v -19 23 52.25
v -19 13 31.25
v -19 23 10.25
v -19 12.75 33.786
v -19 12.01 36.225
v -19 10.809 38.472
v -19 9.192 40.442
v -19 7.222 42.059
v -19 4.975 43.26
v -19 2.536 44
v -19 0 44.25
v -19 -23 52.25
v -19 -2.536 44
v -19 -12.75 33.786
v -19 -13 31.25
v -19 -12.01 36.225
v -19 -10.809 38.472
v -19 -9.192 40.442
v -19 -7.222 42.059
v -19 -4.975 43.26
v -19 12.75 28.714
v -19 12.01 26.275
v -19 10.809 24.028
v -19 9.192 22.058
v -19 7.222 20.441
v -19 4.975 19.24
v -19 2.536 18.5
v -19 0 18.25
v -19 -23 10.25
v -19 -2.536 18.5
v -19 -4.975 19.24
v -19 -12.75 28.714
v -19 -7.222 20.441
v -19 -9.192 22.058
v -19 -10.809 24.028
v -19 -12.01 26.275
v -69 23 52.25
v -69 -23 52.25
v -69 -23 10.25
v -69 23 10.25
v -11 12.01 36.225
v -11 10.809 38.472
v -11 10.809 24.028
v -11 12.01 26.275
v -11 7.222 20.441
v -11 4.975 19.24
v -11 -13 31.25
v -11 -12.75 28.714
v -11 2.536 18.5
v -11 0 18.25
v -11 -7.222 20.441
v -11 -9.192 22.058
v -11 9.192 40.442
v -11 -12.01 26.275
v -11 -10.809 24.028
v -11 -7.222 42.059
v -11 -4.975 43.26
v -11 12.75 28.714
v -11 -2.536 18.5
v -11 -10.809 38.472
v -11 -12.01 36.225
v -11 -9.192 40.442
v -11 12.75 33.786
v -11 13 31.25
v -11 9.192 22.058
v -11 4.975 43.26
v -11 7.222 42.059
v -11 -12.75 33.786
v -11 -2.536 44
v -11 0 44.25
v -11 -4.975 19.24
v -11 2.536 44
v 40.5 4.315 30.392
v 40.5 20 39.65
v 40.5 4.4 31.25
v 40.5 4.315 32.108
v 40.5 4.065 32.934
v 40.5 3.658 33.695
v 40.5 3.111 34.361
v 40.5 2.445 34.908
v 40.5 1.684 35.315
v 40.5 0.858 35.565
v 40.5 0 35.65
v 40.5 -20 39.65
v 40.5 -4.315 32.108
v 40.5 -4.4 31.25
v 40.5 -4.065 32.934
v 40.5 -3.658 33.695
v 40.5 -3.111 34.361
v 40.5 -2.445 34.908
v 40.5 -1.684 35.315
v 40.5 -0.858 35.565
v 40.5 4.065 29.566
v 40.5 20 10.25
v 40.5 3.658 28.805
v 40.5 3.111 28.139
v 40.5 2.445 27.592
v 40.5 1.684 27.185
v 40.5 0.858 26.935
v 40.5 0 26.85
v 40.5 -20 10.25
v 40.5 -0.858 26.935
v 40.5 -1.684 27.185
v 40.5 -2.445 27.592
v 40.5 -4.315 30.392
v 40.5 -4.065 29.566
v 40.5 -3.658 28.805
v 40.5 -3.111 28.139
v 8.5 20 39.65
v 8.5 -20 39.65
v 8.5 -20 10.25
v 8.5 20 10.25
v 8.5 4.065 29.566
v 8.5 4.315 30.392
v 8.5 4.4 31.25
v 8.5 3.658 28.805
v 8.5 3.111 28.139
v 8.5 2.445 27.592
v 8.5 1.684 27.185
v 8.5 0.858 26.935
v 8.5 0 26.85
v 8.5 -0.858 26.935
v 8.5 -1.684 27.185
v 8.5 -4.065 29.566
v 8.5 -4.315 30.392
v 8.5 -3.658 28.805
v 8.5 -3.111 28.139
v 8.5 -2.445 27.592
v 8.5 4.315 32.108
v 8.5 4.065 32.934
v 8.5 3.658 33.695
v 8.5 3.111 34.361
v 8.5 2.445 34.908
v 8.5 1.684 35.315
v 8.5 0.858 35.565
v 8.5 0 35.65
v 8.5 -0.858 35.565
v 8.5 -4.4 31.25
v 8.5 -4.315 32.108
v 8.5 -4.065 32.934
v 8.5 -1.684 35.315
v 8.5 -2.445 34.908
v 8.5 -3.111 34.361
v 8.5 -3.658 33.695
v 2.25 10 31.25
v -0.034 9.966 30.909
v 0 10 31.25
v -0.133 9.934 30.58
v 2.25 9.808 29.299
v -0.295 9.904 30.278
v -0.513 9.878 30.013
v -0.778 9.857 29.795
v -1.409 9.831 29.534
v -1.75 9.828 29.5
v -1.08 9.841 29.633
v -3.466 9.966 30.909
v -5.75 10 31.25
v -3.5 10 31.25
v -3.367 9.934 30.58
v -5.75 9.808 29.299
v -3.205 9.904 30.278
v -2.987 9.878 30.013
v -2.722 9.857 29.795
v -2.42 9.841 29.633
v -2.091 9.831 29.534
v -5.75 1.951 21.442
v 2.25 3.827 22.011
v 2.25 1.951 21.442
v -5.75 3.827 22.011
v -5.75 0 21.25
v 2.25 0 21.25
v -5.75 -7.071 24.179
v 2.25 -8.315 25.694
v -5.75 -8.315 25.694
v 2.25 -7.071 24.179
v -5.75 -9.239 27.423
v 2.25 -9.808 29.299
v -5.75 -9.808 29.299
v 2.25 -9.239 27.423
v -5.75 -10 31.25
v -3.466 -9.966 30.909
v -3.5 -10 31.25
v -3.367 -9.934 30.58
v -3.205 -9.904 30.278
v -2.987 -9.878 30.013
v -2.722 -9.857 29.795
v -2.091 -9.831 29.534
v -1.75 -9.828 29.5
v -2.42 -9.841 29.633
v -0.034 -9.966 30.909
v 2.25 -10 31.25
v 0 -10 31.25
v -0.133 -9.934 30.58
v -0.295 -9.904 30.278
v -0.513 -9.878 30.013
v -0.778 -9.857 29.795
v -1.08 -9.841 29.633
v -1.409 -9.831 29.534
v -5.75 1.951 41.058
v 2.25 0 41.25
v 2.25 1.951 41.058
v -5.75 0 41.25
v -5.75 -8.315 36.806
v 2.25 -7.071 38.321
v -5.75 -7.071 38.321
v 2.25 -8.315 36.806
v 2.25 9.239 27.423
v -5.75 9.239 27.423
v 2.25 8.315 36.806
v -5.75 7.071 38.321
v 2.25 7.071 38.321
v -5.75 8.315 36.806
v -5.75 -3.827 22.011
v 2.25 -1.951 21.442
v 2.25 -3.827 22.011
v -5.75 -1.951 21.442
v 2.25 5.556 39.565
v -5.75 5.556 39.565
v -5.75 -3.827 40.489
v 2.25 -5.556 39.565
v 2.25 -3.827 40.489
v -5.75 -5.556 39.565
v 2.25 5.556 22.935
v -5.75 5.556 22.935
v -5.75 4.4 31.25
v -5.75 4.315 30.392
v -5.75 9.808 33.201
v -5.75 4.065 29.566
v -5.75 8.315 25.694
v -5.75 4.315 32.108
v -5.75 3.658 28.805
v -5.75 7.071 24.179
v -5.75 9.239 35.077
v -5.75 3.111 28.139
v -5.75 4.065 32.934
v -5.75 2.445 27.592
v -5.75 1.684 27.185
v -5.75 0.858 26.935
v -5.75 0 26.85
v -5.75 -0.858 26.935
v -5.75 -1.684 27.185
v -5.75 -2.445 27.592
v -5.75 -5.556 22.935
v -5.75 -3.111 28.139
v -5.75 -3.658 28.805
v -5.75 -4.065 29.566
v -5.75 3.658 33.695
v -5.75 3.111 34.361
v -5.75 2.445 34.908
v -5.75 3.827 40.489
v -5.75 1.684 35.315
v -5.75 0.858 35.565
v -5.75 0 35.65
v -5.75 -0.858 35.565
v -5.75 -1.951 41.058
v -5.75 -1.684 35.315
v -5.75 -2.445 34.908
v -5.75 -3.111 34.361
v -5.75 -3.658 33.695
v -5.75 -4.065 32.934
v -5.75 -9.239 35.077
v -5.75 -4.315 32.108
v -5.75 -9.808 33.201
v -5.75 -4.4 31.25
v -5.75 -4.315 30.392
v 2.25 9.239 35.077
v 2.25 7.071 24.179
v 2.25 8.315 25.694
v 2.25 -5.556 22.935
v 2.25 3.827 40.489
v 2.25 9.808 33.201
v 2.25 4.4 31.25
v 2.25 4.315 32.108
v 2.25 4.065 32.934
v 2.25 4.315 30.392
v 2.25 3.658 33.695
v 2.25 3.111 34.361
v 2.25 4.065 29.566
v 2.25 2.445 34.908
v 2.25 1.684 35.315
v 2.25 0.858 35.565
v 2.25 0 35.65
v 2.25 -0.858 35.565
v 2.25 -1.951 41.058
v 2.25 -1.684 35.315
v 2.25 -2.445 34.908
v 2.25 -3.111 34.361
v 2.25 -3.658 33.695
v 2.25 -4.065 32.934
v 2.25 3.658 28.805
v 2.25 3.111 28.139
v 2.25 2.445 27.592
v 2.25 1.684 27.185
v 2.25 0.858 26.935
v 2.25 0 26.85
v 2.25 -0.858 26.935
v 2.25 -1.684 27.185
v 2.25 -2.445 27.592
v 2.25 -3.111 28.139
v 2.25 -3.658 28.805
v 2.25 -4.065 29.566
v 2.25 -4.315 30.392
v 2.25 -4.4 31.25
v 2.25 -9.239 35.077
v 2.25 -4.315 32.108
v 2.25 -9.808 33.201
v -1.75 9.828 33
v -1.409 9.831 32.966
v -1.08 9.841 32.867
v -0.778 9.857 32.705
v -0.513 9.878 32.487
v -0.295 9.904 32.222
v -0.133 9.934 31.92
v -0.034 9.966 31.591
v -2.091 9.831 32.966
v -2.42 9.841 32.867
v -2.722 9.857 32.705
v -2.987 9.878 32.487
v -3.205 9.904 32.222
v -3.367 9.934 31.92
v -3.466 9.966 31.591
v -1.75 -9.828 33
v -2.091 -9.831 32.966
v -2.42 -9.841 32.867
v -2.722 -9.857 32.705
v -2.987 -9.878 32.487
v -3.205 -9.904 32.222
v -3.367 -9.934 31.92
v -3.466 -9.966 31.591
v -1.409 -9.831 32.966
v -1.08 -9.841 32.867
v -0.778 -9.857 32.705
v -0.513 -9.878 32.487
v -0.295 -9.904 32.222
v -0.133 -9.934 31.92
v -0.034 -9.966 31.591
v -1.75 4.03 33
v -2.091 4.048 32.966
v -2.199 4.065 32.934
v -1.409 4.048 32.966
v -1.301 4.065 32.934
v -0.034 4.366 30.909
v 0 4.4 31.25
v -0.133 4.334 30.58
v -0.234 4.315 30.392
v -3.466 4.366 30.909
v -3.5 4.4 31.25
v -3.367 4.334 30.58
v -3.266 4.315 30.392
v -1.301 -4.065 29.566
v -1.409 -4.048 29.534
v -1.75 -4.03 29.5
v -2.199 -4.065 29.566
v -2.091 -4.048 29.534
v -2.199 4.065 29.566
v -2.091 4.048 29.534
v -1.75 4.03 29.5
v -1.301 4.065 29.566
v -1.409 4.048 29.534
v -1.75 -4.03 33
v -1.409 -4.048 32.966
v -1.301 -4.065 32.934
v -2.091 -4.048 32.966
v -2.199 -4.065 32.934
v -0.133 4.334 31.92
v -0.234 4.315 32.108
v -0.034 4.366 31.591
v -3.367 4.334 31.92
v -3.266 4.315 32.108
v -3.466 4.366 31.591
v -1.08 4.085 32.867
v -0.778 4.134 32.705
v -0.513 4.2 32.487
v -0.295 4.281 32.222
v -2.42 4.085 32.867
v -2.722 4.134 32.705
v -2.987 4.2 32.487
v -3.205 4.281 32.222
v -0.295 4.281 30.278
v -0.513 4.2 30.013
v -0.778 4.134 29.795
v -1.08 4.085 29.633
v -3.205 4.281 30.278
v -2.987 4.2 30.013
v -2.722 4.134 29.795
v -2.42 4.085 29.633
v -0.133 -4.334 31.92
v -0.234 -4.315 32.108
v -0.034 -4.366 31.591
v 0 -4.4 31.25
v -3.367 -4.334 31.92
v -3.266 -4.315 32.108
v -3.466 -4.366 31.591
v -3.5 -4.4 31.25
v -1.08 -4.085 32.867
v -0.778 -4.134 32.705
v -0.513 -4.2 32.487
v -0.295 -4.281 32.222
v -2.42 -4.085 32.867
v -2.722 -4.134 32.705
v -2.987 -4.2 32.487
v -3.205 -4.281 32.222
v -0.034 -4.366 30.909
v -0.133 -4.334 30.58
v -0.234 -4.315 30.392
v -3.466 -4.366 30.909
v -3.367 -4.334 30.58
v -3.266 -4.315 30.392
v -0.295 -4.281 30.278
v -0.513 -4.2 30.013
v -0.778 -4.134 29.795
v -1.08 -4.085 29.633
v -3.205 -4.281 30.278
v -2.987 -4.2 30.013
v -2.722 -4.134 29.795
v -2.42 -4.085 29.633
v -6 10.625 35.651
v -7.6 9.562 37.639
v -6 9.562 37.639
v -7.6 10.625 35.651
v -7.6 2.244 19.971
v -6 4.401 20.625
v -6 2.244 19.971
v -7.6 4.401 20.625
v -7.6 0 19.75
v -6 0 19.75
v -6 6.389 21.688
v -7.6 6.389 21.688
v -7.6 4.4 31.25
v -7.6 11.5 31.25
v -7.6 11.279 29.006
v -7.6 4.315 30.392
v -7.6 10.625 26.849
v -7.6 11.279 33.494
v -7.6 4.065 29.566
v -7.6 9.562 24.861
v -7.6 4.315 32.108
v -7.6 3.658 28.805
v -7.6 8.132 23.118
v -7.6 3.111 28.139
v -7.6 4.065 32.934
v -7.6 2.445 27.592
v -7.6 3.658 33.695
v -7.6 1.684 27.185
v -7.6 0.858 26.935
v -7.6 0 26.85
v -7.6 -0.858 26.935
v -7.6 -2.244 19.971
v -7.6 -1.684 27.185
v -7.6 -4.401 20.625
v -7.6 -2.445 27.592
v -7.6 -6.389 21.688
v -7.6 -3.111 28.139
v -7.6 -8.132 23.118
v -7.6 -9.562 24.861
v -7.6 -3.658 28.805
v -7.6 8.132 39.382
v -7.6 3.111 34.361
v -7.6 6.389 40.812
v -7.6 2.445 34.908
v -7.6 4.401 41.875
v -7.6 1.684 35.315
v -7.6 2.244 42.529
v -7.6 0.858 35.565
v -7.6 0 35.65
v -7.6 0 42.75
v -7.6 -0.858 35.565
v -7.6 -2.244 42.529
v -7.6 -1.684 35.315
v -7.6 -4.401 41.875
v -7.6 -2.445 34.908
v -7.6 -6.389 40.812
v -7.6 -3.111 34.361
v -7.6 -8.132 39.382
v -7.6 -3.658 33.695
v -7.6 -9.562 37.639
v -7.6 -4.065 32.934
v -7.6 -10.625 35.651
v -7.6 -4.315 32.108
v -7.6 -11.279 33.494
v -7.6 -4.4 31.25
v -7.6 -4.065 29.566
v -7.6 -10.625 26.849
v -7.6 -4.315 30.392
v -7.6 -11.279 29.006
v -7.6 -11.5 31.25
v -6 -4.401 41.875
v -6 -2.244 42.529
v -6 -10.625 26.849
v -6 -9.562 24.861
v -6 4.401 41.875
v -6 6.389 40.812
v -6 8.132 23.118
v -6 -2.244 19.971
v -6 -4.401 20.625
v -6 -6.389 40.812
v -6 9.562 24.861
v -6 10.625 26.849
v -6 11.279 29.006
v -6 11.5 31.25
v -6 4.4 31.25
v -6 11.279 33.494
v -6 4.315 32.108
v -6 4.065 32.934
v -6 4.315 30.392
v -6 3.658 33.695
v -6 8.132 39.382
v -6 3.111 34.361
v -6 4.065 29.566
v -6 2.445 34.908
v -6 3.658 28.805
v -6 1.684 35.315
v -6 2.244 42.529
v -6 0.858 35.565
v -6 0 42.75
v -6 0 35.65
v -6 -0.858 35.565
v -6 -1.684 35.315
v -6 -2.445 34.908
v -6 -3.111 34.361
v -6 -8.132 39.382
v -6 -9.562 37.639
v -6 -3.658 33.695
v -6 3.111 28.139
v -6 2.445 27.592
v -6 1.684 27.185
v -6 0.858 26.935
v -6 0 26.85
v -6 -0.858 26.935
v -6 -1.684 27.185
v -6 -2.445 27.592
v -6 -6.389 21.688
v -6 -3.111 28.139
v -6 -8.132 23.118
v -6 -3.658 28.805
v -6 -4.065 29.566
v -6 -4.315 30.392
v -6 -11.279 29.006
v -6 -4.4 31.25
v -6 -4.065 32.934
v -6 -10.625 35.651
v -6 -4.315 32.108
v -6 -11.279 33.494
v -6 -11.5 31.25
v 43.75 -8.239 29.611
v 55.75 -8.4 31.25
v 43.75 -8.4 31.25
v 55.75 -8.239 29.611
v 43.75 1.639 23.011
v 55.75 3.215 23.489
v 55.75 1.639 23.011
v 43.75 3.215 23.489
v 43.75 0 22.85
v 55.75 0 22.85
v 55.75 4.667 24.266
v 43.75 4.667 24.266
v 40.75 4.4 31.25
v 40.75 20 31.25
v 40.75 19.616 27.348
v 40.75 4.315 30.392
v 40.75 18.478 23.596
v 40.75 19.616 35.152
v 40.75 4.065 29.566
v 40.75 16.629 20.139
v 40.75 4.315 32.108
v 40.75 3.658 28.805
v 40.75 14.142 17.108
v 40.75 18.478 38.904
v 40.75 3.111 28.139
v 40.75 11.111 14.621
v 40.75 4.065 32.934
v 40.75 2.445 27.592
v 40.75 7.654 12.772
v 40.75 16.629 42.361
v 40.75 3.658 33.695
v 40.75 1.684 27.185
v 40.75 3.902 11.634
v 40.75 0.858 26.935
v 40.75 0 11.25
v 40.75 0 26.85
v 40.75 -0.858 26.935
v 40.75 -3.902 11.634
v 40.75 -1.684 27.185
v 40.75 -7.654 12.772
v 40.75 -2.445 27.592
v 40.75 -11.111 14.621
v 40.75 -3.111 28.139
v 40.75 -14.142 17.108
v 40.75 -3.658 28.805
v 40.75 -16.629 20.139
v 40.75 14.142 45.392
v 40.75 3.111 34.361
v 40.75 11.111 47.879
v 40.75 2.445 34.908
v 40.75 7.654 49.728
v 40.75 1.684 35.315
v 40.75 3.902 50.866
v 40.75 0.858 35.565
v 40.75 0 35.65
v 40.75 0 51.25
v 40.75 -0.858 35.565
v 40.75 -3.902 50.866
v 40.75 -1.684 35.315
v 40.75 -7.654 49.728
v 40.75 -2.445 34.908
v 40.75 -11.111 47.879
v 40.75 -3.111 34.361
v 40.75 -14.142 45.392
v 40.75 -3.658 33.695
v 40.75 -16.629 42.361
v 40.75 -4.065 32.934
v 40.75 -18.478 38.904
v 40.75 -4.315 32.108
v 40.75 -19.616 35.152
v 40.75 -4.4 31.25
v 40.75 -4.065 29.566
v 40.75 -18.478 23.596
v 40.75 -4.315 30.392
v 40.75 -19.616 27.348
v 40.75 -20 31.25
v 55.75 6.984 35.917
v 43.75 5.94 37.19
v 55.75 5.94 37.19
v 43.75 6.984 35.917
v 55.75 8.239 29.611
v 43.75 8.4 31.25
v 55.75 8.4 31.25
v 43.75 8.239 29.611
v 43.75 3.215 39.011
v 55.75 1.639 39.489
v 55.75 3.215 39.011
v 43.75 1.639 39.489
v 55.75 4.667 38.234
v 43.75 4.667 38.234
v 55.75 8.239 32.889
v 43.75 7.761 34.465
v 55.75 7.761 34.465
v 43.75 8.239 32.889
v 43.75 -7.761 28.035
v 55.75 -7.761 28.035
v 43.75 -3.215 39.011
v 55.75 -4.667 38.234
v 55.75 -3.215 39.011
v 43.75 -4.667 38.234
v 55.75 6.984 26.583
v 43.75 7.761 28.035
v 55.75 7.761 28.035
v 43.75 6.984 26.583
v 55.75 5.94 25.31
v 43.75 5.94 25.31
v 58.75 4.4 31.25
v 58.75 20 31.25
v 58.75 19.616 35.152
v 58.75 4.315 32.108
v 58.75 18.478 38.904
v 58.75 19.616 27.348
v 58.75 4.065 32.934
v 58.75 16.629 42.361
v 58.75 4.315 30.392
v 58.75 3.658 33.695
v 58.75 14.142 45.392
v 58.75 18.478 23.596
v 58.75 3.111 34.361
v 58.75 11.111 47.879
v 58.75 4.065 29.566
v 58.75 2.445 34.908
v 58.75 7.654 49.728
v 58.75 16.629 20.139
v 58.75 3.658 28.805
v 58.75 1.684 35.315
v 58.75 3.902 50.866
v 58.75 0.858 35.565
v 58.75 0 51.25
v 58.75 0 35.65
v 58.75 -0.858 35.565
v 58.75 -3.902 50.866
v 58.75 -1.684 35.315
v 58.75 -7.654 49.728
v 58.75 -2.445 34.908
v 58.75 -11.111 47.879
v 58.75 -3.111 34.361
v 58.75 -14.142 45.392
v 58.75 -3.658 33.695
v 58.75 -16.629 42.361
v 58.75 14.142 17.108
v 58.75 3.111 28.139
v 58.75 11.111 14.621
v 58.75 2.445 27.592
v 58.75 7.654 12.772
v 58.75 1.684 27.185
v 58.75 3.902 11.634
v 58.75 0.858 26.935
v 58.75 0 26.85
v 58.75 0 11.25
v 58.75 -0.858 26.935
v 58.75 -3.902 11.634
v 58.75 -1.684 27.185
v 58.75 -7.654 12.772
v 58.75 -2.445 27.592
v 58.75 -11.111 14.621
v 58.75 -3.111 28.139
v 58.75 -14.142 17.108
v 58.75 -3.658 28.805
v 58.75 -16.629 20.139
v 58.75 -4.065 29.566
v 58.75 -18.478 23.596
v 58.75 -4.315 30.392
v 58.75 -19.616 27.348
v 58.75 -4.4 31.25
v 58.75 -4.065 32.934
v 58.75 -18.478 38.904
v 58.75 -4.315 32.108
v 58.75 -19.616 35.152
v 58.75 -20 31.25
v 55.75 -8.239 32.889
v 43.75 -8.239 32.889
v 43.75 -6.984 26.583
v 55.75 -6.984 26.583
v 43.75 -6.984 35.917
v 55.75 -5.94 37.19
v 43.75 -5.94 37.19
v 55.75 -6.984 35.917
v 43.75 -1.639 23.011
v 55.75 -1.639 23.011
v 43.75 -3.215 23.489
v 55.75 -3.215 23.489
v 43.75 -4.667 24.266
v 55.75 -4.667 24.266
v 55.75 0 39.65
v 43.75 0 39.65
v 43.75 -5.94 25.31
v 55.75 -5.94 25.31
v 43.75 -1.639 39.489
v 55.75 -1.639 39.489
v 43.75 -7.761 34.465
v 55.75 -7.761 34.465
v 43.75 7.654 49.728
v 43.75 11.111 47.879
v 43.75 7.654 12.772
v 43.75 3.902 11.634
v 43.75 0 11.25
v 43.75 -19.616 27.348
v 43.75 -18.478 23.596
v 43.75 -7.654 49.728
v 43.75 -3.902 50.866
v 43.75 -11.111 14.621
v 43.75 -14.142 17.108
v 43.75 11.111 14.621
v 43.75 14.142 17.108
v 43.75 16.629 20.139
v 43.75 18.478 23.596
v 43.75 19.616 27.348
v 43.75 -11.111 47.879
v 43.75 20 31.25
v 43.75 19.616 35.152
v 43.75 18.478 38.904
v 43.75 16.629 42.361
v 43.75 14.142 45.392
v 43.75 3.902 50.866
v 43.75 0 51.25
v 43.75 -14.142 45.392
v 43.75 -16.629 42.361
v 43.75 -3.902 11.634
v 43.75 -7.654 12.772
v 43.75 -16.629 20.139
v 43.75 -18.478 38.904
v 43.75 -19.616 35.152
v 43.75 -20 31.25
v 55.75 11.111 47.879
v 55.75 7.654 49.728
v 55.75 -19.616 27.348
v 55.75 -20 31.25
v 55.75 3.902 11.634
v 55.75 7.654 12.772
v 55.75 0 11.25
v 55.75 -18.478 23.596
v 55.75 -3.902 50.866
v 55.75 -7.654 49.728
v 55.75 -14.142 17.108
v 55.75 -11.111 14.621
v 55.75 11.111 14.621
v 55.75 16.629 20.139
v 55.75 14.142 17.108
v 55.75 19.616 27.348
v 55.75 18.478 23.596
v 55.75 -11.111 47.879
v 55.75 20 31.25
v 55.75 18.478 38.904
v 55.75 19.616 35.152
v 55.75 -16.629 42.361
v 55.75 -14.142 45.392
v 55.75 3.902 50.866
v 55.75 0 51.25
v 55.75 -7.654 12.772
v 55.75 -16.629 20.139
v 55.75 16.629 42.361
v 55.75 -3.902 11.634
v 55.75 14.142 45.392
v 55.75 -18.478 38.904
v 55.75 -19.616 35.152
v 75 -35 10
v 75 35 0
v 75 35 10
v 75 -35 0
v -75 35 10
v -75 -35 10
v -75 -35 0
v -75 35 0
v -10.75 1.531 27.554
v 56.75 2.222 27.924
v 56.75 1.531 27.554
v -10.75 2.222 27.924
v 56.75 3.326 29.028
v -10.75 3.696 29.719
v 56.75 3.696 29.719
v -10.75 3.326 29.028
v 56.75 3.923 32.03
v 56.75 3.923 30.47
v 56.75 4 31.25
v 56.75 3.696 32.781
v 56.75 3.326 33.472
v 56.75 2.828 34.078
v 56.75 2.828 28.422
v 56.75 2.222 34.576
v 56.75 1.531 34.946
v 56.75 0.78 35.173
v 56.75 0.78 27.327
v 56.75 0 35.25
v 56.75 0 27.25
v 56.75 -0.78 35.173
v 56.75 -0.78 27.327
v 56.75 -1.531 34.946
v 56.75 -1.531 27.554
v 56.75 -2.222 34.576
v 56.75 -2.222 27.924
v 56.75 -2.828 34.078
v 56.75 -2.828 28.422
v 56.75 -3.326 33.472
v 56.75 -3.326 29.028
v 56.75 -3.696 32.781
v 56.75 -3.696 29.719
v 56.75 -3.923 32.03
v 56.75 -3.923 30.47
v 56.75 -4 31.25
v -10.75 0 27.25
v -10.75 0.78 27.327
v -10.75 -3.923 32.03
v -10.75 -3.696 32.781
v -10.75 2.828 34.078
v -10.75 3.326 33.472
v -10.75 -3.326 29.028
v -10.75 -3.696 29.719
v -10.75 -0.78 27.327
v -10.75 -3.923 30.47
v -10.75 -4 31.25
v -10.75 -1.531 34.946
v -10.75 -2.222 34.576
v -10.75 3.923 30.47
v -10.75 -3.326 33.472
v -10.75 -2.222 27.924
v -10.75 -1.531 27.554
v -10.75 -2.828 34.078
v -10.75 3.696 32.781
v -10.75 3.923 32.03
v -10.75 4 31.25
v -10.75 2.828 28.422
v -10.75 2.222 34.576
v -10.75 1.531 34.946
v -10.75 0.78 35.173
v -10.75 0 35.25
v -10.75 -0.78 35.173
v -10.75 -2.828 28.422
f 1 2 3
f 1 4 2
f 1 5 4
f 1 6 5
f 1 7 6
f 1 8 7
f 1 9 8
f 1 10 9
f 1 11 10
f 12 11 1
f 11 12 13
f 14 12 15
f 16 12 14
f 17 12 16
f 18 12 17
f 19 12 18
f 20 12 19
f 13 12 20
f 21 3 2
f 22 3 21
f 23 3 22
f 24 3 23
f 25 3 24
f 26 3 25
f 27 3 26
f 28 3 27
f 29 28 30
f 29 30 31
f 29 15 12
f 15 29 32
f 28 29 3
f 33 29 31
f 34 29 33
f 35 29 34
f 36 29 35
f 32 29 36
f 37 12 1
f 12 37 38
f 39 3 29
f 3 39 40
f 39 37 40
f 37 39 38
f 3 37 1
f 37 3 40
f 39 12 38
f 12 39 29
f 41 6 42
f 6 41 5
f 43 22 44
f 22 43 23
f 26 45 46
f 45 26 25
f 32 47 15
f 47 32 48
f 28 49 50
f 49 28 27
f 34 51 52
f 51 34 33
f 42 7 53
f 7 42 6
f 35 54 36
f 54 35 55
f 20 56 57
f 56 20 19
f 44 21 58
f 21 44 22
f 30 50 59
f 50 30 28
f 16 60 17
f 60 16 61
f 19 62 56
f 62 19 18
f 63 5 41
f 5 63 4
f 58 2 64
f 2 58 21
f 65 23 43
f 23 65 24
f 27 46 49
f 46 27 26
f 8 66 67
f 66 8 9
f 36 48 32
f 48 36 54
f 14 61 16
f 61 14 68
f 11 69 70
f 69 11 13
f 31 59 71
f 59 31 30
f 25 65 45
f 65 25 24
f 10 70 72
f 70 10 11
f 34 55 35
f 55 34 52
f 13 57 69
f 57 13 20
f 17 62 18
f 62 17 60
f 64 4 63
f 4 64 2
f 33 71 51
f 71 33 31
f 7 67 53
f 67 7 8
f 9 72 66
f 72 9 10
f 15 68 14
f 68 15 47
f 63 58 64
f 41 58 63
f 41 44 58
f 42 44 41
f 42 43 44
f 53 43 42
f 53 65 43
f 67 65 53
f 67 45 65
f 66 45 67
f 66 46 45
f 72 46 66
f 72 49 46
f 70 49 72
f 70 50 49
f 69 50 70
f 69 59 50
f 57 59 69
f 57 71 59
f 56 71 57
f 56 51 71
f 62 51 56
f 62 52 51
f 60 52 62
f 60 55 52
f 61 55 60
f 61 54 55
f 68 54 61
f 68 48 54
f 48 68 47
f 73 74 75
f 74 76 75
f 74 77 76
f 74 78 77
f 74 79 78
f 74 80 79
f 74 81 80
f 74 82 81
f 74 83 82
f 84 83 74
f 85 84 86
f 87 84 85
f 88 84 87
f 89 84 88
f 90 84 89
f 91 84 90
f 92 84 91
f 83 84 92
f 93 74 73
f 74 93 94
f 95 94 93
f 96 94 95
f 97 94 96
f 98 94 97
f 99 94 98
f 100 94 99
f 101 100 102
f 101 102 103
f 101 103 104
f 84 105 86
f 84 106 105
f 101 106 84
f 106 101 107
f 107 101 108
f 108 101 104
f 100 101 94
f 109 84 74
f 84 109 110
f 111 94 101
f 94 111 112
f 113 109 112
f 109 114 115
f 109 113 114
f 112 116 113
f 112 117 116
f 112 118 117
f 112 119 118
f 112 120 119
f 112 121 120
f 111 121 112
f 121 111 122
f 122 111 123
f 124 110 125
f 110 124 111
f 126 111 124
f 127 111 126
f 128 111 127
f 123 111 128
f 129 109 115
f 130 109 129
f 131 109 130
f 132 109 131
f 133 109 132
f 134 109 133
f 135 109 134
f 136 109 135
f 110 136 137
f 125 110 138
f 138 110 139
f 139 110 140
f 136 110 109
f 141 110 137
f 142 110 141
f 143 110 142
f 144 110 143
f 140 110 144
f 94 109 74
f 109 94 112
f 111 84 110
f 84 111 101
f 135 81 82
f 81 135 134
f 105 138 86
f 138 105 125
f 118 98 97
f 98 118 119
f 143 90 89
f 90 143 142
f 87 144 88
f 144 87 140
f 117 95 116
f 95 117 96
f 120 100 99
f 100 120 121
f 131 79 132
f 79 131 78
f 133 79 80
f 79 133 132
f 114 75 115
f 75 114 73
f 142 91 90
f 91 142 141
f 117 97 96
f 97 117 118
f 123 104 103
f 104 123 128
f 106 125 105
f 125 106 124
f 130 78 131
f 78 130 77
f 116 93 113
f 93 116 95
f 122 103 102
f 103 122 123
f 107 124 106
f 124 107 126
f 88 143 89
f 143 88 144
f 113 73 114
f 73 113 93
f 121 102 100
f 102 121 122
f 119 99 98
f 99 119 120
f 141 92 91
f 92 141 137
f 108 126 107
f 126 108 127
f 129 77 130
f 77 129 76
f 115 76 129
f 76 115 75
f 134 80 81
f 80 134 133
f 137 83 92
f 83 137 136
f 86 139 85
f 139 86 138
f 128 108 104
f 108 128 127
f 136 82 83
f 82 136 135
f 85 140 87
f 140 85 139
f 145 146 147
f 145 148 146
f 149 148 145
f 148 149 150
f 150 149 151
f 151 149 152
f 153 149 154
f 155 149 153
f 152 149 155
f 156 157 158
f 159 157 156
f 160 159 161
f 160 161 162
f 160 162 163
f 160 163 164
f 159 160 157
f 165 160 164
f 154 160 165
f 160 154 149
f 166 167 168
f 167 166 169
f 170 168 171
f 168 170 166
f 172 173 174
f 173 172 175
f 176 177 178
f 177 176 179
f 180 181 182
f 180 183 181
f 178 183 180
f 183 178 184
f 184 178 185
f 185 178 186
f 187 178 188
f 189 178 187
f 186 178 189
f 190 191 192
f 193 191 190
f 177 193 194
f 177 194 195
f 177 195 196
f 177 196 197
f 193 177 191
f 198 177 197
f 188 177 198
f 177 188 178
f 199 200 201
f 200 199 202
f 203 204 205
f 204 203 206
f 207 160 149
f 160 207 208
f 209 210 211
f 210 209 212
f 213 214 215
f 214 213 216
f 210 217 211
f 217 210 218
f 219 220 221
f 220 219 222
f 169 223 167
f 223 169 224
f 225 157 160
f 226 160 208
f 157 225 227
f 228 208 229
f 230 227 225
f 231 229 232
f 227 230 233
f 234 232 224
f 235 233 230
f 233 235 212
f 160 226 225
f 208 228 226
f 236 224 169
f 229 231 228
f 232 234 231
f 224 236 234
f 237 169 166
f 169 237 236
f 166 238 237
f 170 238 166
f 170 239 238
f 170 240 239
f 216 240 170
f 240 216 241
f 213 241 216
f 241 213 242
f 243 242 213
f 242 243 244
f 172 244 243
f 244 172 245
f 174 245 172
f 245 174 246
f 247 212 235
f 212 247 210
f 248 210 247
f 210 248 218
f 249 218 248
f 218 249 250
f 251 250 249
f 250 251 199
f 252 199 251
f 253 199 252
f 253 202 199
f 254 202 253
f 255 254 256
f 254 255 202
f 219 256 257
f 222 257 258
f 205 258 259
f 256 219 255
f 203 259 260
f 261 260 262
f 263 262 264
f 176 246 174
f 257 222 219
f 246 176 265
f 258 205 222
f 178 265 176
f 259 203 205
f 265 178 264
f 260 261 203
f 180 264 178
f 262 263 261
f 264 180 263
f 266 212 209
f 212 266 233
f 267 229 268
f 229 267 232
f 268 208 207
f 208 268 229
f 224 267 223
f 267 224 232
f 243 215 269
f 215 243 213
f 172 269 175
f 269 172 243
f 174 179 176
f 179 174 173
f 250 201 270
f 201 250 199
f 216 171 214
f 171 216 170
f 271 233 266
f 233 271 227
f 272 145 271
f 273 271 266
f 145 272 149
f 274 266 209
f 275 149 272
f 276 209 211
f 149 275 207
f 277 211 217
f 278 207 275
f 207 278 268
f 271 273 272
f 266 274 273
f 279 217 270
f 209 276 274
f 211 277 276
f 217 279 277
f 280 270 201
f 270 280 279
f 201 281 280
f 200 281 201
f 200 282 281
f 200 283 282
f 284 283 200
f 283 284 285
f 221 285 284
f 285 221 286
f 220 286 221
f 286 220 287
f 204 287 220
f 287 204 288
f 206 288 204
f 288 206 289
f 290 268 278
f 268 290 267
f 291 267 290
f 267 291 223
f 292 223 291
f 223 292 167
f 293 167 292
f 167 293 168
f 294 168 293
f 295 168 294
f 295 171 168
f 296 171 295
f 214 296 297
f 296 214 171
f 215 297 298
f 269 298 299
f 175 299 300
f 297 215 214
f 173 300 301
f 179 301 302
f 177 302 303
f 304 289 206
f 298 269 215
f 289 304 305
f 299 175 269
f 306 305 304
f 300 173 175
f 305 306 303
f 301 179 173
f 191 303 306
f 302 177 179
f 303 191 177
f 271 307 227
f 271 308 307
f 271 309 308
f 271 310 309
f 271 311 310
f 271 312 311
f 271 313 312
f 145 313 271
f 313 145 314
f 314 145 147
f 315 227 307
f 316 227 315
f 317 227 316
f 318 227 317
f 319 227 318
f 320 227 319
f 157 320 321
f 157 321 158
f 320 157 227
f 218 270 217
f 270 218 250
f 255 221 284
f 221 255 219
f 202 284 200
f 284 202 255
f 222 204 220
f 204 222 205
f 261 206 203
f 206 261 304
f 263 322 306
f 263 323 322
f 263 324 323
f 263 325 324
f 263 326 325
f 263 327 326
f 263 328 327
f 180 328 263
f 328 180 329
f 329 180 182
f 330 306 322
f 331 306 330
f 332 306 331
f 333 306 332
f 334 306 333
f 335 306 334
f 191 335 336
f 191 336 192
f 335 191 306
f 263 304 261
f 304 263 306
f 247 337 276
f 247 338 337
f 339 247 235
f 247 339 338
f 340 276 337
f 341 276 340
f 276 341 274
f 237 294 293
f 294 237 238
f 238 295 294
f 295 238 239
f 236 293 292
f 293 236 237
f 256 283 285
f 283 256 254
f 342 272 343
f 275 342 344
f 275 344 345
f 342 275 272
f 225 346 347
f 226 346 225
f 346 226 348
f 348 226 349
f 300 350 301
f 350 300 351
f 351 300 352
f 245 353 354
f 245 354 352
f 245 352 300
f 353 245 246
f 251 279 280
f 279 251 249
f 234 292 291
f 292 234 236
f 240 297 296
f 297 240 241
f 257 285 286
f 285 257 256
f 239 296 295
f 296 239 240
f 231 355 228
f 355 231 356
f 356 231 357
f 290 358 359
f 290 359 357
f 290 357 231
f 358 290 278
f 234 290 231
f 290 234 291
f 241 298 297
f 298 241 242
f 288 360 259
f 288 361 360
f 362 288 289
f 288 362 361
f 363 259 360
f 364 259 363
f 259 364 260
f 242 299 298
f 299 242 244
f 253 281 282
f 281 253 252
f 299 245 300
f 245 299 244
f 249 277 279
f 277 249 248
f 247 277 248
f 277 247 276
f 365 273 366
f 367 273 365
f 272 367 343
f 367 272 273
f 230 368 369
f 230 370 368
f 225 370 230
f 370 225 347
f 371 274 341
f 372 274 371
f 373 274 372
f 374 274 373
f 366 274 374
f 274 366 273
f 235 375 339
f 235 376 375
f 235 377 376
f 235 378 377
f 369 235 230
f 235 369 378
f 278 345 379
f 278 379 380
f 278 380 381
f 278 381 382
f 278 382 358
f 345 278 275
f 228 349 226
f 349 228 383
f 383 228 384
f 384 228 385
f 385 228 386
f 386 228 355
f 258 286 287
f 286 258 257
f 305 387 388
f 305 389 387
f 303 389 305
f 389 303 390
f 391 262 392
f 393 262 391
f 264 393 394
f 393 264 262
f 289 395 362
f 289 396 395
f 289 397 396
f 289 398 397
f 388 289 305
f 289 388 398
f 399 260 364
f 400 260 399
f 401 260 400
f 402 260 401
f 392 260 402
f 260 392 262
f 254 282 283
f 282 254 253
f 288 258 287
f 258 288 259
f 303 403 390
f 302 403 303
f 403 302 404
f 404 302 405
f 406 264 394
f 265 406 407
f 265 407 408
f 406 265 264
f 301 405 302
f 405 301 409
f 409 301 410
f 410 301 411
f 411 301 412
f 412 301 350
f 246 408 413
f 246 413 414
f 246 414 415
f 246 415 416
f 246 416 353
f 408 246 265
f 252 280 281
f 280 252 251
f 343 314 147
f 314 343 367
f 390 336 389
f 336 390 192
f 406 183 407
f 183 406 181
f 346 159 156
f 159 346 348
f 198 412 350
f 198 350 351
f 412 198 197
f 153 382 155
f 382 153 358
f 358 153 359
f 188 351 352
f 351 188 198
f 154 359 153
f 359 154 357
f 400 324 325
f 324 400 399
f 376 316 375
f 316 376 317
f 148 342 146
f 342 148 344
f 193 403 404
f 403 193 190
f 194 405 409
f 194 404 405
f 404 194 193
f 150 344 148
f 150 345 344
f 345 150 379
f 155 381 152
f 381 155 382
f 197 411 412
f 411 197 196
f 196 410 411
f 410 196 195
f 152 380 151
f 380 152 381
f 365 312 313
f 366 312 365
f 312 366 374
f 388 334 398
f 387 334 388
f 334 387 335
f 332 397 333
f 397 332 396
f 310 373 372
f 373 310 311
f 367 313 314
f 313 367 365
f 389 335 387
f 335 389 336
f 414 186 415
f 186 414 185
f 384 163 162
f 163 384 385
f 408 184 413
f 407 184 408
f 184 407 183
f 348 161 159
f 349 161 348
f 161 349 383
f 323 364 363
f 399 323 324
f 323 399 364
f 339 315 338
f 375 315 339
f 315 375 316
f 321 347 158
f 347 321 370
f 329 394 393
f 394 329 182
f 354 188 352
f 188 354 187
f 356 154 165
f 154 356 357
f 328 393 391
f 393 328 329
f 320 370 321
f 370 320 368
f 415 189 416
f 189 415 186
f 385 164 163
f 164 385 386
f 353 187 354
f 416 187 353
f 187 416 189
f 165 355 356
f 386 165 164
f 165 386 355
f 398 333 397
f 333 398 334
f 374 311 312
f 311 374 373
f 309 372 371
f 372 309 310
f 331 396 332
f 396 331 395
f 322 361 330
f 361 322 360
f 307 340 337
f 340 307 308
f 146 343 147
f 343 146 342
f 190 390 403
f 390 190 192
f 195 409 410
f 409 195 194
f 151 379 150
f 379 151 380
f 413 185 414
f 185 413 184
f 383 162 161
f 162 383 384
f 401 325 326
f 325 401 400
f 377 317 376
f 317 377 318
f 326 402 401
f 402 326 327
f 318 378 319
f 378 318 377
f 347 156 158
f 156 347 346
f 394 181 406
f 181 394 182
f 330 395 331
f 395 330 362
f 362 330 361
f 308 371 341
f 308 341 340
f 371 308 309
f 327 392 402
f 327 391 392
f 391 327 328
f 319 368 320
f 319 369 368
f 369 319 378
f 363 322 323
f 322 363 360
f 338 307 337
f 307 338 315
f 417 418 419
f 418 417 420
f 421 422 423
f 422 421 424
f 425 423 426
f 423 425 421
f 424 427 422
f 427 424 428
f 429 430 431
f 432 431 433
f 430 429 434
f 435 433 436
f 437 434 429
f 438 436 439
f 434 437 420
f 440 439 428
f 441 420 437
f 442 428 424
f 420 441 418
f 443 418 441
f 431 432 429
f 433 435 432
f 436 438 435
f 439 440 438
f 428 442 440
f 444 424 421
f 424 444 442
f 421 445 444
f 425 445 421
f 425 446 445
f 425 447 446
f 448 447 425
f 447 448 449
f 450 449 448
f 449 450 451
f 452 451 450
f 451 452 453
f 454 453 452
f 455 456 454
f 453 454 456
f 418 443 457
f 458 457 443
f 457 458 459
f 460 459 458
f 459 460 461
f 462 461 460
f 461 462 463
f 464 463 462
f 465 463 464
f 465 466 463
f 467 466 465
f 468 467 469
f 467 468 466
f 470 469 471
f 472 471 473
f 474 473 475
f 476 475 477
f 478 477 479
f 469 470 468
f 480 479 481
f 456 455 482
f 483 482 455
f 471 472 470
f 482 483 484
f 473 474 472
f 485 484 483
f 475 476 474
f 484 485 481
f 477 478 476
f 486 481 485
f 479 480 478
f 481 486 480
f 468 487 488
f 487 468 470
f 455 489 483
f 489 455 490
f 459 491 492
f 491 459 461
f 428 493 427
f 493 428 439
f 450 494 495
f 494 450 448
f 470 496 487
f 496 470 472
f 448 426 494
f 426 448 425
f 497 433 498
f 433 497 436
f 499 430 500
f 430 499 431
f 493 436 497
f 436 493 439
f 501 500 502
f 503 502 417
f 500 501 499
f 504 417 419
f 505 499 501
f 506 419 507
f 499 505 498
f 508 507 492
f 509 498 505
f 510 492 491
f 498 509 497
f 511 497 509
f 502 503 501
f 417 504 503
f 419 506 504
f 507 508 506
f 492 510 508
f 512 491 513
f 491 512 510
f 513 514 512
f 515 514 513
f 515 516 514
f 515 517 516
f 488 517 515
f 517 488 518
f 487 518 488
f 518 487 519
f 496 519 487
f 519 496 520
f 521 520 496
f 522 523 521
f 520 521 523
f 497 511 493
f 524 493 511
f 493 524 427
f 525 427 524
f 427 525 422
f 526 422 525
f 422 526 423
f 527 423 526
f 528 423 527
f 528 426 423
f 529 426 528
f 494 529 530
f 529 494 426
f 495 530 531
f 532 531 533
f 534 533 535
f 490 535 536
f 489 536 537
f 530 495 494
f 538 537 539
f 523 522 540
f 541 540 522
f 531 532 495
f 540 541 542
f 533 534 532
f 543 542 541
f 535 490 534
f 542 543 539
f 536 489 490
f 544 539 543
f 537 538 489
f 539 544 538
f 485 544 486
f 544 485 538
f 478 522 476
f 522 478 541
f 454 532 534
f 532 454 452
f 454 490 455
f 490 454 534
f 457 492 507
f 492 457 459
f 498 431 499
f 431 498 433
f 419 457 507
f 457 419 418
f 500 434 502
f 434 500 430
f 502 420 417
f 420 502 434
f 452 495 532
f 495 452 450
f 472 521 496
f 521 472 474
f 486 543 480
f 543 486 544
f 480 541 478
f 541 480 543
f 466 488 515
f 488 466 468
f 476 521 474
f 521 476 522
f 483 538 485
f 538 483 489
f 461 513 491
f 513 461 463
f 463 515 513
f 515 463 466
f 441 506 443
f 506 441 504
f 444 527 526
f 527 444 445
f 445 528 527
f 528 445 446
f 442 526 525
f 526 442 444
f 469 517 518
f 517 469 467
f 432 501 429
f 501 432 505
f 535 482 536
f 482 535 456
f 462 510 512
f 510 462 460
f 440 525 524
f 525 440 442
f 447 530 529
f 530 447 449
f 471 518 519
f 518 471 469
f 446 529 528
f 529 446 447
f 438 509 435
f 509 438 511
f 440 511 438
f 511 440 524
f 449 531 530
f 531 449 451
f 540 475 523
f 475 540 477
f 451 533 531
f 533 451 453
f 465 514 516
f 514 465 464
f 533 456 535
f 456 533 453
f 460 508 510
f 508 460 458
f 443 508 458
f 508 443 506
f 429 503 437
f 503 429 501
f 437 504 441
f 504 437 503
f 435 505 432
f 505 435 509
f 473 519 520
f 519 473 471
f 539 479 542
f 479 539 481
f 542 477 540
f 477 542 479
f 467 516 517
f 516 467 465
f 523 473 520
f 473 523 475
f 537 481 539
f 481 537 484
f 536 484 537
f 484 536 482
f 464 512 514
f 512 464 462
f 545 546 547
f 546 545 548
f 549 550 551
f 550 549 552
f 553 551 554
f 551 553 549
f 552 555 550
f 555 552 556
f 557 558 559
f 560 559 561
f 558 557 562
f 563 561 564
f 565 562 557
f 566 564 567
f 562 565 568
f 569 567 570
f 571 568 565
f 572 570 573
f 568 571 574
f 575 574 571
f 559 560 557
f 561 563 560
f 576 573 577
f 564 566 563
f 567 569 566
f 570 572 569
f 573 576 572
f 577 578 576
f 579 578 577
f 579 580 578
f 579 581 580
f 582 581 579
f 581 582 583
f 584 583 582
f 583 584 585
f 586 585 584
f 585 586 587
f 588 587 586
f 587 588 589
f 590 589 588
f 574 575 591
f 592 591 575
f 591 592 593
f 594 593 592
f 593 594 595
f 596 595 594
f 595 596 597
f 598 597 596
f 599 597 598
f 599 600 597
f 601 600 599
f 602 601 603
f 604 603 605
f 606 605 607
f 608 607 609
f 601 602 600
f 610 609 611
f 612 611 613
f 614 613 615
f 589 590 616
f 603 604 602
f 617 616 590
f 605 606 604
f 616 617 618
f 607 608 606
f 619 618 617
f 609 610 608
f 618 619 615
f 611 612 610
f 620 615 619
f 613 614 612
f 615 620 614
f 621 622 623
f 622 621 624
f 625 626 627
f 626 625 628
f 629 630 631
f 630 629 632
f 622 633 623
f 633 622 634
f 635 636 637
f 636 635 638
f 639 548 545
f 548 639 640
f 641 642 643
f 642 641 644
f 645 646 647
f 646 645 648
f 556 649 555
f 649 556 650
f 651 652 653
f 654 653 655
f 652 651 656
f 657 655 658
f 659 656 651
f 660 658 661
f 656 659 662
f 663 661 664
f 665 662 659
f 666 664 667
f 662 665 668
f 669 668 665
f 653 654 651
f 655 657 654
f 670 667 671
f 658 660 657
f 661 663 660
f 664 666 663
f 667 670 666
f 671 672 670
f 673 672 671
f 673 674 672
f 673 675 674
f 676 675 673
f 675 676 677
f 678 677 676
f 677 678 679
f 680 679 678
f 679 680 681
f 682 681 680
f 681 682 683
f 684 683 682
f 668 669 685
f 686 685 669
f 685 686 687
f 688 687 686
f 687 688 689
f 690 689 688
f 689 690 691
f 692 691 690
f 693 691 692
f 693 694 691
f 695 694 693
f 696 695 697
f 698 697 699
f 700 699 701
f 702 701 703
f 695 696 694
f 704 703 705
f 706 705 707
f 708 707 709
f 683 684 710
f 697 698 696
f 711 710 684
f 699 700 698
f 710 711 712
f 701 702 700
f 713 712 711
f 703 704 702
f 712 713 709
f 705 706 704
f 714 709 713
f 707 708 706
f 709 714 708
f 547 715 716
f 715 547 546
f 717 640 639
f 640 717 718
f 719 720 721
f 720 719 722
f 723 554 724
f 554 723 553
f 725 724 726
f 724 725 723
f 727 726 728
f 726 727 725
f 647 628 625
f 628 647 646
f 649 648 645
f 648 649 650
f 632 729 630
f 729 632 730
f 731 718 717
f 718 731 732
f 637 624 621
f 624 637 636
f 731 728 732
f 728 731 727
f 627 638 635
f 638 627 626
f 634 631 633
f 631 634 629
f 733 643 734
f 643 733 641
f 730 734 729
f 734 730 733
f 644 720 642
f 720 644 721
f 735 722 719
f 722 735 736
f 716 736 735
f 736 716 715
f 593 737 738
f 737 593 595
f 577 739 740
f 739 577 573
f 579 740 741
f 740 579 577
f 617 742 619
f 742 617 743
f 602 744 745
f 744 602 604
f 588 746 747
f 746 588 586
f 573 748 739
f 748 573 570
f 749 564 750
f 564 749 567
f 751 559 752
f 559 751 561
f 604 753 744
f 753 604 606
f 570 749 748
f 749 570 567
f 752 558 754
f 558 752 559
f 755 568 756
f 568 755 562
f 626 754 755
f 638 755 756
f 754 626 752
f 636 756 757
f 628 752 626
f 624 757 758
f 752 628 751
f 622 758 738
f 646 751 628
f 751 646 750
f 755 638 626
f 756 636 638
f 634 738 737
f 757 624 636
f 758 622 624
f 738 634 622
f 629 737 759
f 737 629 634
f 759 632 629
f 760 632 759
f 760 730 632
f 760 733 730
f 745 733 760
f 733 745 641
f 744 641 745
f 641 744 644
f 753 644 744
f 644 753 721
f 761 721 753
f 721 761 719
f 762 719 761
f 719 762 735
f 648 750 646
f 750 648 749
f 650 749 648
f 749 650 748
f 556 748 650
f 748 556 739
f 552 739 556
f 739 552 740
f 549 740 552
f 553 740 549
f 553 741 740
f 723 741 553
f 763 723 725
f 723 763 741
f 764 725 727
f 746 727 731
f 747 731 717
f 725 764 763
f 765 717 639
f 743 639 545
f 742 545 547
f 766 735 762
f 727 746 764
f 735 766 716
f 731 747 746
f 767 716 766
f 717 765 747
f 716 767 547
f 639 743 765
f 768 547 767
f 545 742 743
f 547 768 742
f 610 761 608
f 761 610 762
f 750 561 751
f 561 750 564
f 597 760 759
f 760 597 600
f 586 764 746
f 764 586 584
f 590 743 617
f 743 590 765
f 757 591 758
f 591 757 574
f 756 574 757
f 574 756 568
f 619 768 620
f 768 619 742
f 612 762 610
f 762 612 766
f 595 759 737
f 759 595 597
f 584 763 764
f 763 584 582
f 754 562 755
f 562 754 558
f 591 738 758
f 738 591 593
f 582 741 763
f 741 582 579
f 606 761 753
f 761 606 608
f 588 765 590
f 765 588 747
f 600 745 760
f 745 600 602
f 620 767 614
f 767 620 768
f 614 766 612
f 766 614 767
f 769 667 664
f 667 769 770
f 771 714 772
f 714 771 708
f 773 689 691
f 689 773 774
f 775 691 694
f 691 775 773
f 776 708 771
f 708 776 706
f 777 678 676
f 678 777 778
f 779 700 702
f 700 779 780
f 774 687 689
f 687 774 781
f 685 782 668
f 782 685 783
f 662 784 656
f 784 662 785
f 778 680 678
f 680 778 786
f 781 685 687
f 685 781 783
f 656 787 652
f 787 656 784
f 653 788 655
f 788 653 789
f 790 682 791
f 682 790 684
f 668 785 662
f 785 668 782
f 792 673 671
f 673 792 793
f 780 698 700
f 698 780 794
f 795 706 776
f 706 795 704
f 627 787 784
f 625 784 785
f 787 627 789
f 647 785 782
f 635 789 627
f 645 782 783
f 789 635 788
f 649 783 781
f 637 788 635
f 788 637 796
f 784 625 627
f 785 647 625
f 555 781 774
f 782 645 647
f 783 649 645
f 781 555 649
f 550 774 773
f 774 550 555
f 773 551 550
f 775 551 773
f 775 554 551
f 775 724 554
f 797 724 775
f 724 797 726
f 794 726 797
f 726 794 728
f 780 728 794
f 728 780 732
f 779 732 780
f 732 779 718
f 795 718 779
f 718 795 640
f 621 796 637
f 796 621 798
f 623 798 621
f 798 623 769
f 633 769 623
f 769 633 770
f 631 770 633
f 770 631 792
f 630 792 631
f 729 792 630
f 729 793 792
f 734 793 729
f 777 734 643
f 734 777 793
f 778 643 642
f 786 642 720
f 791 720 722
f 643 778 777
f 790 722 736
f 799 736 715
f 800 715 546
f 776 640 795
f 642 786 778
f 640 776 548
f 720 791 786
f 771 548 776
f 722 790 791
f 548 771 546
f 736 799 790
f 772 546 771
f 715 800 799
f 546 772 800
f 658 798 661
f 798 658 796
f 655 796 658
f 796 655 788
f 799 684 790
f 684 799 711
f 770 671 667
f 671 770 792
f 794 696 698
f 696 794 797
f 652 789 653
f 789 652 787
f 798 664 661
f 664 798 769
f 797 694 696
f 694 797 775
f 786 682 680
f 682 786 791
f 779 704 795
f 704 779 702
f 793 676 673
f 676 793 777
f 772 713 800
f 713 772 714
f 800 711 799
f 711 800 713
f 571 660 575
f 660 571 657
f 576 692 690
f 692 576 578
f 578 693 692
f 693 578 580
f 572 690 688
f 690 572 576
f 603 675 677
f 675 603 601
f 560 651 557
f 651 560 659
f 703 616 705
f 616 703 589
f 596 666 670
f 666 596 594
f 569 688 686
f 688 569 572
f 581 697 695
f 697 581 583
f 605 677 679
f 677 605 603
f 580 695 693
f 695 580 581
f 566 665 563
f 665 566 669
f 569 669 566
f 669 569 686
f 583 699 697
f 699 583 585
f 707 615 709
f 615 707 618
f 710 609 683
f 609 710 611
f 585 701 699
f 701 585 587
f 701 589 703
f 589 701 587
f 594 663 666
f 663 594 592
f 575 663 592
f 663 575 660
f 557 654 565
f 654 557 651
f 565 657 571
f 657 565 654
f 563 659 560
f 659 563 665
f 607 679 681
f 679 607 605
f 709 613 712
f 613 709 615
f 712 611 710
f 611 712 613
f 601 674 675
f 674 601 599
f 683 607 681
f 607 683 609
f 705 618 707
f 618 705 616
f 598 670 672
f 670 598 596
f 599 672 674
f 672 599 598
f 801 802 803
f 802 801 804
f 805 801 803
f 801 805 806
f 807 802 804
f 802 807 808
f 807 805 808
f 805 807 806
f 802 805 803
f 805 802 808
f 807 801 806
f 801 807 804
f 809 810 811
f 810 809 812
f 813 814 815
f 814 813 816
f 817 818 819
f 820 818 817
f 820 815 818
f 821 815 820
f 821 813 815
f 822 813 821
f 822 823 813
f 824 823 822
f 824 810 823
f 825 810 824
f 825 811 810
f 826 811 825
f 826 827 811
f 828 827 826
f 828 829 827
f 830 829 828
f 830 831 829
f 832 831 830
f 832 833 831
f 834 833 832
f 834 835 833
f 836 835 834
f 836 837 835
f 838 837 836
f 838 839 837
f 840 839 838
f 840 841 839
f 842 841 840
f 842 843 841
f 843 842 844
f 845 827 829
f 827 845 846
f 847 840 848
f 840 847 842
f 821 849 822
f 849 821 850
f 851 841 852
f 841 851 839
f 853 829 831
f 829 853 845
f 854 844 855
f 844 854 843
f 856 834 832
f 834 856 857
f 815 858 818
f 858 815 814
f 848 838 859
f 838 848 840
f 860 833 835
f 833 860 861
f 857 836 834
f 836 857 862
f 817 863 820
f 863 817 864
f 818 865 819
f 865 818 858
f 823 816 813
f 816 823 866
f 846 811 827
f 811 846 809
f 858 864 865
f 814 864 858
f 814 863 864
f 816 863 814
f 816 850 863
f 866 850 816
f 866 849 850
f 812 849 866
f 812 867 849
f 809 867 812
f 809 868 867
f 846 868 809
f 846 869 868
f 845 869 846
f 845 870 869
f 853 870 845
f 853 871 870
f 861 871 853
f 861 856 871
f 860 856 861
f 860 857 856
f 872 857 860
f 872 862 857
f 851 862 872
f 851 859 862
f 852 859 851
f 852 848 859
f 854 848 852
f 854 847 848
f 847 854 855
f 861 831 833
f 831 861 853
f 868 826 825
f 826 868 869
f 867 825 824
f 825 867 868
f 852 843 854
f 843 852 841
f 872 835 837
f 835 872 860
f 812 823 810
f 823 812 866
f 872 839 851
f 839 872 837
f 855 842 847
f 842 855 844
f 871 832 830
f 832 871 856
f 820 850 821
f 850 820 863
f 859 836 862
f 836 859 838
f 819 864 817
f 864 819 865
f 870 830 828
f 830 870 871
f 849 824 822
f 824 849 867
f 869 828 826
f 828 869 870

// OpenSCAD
$fn = 32;

// ------------------------------------------------------------------------
// Motor drive station: motor 50 x 42 mm, shaft d8, pulley d40
// Every part is its own module, assembly() places every instance.
// ------------------------------------------------------------------------

// --- part 1 ---
module station_bed() {
  difference() {
    translate([-75, -35, 0]) cube([150, 70, 10]);
  }
}

// --- part 2 ---
module drive_motor() {
  union() {
    translate([-25, -23, 0]) cube([50, 46, 42]);
    translate([29, 0, 21]) rotate([0, 90, 0]) cylinder(h = 8, d = 26, center = true);
  }
}

// --- part 3 ---
module pillow_block() {
  difference() {
    translate([-16, -20, 0]) cube([32, 40, 29.4]);
    translate([0, 0, 21]) rotate([0, 90, 0]) cylinder(h = 34, d = 8.8, center = true);
  }
}

// --- part 4 ---
module drive_shaft() {
  translate([0, 0, -33.75]) cylinder(h = 67.5, d = 8);
}

// --- part 5 ---
module shaft_collar() {
  difference() {
    cylinder(h = 8, d = 20);
    translate([0, 0, -1]) cylinder(h = 10, d = 8.8);
    translate([0, 0, 4]) rotate([90, 0, 0]) cylinder(h = 22, d = 3.5, center = true);
  }
}

// --- part 6 ---
module collar_washer() {
  difference() {
      translate([0, 0, 0]) cylinder(h = 1.6, d = 23);
      translate([0, 0, -1]) cylinder(h = 3.6, d = 8.8);
    }
}

// --- part 7 ---
module drive_pulley() {
  difference() {
    union() {
      cylinder(h = 18, d = 16.8);
      cylinder(h = 3, d = 40);
      translate([0, 0, 15]) cylinder(h = 3, d = 40);
    }
    translate([0, 0, -1]) cylinder(h = 20, d = 8.8);
  }
}

// --- assembly ---
module assembly() {
  color([0.80, 0.24, 0.20]) translate([0, 0, 0]) rotate([0, 0, 0]) station_bed();
  color([0.20, 0.45, 0.75]) translate([-44, 0, 10.25]) rotate([0, 0, 0]) drive_motor();
  color([0.25, 0.62, 0.32]) translate([24.5, 0, 10.25]) rotate([0, 0, 0]) pillow_block();
  color([0.92, 0.70, 0.18]) translate([23, 0, 31.25]) rotate([0, 90, 0]) drive_shaft();
  color([0.58, 0.35, 0.70]) translate([-5.75, 0, 31.25]) rotate([0, 90, 0]) shaft_collar();
  color([0.16, 0.66, 0.66]) translate([-7.6, 0, 31.25]) rotate([0, 90, 0]) collar_washer();
  color([0.85, 0.48, 0.18]) translate([40.75, 0, 31.25]) rotate([0, 90, 0]) drive_pulley();
}

assembly();
